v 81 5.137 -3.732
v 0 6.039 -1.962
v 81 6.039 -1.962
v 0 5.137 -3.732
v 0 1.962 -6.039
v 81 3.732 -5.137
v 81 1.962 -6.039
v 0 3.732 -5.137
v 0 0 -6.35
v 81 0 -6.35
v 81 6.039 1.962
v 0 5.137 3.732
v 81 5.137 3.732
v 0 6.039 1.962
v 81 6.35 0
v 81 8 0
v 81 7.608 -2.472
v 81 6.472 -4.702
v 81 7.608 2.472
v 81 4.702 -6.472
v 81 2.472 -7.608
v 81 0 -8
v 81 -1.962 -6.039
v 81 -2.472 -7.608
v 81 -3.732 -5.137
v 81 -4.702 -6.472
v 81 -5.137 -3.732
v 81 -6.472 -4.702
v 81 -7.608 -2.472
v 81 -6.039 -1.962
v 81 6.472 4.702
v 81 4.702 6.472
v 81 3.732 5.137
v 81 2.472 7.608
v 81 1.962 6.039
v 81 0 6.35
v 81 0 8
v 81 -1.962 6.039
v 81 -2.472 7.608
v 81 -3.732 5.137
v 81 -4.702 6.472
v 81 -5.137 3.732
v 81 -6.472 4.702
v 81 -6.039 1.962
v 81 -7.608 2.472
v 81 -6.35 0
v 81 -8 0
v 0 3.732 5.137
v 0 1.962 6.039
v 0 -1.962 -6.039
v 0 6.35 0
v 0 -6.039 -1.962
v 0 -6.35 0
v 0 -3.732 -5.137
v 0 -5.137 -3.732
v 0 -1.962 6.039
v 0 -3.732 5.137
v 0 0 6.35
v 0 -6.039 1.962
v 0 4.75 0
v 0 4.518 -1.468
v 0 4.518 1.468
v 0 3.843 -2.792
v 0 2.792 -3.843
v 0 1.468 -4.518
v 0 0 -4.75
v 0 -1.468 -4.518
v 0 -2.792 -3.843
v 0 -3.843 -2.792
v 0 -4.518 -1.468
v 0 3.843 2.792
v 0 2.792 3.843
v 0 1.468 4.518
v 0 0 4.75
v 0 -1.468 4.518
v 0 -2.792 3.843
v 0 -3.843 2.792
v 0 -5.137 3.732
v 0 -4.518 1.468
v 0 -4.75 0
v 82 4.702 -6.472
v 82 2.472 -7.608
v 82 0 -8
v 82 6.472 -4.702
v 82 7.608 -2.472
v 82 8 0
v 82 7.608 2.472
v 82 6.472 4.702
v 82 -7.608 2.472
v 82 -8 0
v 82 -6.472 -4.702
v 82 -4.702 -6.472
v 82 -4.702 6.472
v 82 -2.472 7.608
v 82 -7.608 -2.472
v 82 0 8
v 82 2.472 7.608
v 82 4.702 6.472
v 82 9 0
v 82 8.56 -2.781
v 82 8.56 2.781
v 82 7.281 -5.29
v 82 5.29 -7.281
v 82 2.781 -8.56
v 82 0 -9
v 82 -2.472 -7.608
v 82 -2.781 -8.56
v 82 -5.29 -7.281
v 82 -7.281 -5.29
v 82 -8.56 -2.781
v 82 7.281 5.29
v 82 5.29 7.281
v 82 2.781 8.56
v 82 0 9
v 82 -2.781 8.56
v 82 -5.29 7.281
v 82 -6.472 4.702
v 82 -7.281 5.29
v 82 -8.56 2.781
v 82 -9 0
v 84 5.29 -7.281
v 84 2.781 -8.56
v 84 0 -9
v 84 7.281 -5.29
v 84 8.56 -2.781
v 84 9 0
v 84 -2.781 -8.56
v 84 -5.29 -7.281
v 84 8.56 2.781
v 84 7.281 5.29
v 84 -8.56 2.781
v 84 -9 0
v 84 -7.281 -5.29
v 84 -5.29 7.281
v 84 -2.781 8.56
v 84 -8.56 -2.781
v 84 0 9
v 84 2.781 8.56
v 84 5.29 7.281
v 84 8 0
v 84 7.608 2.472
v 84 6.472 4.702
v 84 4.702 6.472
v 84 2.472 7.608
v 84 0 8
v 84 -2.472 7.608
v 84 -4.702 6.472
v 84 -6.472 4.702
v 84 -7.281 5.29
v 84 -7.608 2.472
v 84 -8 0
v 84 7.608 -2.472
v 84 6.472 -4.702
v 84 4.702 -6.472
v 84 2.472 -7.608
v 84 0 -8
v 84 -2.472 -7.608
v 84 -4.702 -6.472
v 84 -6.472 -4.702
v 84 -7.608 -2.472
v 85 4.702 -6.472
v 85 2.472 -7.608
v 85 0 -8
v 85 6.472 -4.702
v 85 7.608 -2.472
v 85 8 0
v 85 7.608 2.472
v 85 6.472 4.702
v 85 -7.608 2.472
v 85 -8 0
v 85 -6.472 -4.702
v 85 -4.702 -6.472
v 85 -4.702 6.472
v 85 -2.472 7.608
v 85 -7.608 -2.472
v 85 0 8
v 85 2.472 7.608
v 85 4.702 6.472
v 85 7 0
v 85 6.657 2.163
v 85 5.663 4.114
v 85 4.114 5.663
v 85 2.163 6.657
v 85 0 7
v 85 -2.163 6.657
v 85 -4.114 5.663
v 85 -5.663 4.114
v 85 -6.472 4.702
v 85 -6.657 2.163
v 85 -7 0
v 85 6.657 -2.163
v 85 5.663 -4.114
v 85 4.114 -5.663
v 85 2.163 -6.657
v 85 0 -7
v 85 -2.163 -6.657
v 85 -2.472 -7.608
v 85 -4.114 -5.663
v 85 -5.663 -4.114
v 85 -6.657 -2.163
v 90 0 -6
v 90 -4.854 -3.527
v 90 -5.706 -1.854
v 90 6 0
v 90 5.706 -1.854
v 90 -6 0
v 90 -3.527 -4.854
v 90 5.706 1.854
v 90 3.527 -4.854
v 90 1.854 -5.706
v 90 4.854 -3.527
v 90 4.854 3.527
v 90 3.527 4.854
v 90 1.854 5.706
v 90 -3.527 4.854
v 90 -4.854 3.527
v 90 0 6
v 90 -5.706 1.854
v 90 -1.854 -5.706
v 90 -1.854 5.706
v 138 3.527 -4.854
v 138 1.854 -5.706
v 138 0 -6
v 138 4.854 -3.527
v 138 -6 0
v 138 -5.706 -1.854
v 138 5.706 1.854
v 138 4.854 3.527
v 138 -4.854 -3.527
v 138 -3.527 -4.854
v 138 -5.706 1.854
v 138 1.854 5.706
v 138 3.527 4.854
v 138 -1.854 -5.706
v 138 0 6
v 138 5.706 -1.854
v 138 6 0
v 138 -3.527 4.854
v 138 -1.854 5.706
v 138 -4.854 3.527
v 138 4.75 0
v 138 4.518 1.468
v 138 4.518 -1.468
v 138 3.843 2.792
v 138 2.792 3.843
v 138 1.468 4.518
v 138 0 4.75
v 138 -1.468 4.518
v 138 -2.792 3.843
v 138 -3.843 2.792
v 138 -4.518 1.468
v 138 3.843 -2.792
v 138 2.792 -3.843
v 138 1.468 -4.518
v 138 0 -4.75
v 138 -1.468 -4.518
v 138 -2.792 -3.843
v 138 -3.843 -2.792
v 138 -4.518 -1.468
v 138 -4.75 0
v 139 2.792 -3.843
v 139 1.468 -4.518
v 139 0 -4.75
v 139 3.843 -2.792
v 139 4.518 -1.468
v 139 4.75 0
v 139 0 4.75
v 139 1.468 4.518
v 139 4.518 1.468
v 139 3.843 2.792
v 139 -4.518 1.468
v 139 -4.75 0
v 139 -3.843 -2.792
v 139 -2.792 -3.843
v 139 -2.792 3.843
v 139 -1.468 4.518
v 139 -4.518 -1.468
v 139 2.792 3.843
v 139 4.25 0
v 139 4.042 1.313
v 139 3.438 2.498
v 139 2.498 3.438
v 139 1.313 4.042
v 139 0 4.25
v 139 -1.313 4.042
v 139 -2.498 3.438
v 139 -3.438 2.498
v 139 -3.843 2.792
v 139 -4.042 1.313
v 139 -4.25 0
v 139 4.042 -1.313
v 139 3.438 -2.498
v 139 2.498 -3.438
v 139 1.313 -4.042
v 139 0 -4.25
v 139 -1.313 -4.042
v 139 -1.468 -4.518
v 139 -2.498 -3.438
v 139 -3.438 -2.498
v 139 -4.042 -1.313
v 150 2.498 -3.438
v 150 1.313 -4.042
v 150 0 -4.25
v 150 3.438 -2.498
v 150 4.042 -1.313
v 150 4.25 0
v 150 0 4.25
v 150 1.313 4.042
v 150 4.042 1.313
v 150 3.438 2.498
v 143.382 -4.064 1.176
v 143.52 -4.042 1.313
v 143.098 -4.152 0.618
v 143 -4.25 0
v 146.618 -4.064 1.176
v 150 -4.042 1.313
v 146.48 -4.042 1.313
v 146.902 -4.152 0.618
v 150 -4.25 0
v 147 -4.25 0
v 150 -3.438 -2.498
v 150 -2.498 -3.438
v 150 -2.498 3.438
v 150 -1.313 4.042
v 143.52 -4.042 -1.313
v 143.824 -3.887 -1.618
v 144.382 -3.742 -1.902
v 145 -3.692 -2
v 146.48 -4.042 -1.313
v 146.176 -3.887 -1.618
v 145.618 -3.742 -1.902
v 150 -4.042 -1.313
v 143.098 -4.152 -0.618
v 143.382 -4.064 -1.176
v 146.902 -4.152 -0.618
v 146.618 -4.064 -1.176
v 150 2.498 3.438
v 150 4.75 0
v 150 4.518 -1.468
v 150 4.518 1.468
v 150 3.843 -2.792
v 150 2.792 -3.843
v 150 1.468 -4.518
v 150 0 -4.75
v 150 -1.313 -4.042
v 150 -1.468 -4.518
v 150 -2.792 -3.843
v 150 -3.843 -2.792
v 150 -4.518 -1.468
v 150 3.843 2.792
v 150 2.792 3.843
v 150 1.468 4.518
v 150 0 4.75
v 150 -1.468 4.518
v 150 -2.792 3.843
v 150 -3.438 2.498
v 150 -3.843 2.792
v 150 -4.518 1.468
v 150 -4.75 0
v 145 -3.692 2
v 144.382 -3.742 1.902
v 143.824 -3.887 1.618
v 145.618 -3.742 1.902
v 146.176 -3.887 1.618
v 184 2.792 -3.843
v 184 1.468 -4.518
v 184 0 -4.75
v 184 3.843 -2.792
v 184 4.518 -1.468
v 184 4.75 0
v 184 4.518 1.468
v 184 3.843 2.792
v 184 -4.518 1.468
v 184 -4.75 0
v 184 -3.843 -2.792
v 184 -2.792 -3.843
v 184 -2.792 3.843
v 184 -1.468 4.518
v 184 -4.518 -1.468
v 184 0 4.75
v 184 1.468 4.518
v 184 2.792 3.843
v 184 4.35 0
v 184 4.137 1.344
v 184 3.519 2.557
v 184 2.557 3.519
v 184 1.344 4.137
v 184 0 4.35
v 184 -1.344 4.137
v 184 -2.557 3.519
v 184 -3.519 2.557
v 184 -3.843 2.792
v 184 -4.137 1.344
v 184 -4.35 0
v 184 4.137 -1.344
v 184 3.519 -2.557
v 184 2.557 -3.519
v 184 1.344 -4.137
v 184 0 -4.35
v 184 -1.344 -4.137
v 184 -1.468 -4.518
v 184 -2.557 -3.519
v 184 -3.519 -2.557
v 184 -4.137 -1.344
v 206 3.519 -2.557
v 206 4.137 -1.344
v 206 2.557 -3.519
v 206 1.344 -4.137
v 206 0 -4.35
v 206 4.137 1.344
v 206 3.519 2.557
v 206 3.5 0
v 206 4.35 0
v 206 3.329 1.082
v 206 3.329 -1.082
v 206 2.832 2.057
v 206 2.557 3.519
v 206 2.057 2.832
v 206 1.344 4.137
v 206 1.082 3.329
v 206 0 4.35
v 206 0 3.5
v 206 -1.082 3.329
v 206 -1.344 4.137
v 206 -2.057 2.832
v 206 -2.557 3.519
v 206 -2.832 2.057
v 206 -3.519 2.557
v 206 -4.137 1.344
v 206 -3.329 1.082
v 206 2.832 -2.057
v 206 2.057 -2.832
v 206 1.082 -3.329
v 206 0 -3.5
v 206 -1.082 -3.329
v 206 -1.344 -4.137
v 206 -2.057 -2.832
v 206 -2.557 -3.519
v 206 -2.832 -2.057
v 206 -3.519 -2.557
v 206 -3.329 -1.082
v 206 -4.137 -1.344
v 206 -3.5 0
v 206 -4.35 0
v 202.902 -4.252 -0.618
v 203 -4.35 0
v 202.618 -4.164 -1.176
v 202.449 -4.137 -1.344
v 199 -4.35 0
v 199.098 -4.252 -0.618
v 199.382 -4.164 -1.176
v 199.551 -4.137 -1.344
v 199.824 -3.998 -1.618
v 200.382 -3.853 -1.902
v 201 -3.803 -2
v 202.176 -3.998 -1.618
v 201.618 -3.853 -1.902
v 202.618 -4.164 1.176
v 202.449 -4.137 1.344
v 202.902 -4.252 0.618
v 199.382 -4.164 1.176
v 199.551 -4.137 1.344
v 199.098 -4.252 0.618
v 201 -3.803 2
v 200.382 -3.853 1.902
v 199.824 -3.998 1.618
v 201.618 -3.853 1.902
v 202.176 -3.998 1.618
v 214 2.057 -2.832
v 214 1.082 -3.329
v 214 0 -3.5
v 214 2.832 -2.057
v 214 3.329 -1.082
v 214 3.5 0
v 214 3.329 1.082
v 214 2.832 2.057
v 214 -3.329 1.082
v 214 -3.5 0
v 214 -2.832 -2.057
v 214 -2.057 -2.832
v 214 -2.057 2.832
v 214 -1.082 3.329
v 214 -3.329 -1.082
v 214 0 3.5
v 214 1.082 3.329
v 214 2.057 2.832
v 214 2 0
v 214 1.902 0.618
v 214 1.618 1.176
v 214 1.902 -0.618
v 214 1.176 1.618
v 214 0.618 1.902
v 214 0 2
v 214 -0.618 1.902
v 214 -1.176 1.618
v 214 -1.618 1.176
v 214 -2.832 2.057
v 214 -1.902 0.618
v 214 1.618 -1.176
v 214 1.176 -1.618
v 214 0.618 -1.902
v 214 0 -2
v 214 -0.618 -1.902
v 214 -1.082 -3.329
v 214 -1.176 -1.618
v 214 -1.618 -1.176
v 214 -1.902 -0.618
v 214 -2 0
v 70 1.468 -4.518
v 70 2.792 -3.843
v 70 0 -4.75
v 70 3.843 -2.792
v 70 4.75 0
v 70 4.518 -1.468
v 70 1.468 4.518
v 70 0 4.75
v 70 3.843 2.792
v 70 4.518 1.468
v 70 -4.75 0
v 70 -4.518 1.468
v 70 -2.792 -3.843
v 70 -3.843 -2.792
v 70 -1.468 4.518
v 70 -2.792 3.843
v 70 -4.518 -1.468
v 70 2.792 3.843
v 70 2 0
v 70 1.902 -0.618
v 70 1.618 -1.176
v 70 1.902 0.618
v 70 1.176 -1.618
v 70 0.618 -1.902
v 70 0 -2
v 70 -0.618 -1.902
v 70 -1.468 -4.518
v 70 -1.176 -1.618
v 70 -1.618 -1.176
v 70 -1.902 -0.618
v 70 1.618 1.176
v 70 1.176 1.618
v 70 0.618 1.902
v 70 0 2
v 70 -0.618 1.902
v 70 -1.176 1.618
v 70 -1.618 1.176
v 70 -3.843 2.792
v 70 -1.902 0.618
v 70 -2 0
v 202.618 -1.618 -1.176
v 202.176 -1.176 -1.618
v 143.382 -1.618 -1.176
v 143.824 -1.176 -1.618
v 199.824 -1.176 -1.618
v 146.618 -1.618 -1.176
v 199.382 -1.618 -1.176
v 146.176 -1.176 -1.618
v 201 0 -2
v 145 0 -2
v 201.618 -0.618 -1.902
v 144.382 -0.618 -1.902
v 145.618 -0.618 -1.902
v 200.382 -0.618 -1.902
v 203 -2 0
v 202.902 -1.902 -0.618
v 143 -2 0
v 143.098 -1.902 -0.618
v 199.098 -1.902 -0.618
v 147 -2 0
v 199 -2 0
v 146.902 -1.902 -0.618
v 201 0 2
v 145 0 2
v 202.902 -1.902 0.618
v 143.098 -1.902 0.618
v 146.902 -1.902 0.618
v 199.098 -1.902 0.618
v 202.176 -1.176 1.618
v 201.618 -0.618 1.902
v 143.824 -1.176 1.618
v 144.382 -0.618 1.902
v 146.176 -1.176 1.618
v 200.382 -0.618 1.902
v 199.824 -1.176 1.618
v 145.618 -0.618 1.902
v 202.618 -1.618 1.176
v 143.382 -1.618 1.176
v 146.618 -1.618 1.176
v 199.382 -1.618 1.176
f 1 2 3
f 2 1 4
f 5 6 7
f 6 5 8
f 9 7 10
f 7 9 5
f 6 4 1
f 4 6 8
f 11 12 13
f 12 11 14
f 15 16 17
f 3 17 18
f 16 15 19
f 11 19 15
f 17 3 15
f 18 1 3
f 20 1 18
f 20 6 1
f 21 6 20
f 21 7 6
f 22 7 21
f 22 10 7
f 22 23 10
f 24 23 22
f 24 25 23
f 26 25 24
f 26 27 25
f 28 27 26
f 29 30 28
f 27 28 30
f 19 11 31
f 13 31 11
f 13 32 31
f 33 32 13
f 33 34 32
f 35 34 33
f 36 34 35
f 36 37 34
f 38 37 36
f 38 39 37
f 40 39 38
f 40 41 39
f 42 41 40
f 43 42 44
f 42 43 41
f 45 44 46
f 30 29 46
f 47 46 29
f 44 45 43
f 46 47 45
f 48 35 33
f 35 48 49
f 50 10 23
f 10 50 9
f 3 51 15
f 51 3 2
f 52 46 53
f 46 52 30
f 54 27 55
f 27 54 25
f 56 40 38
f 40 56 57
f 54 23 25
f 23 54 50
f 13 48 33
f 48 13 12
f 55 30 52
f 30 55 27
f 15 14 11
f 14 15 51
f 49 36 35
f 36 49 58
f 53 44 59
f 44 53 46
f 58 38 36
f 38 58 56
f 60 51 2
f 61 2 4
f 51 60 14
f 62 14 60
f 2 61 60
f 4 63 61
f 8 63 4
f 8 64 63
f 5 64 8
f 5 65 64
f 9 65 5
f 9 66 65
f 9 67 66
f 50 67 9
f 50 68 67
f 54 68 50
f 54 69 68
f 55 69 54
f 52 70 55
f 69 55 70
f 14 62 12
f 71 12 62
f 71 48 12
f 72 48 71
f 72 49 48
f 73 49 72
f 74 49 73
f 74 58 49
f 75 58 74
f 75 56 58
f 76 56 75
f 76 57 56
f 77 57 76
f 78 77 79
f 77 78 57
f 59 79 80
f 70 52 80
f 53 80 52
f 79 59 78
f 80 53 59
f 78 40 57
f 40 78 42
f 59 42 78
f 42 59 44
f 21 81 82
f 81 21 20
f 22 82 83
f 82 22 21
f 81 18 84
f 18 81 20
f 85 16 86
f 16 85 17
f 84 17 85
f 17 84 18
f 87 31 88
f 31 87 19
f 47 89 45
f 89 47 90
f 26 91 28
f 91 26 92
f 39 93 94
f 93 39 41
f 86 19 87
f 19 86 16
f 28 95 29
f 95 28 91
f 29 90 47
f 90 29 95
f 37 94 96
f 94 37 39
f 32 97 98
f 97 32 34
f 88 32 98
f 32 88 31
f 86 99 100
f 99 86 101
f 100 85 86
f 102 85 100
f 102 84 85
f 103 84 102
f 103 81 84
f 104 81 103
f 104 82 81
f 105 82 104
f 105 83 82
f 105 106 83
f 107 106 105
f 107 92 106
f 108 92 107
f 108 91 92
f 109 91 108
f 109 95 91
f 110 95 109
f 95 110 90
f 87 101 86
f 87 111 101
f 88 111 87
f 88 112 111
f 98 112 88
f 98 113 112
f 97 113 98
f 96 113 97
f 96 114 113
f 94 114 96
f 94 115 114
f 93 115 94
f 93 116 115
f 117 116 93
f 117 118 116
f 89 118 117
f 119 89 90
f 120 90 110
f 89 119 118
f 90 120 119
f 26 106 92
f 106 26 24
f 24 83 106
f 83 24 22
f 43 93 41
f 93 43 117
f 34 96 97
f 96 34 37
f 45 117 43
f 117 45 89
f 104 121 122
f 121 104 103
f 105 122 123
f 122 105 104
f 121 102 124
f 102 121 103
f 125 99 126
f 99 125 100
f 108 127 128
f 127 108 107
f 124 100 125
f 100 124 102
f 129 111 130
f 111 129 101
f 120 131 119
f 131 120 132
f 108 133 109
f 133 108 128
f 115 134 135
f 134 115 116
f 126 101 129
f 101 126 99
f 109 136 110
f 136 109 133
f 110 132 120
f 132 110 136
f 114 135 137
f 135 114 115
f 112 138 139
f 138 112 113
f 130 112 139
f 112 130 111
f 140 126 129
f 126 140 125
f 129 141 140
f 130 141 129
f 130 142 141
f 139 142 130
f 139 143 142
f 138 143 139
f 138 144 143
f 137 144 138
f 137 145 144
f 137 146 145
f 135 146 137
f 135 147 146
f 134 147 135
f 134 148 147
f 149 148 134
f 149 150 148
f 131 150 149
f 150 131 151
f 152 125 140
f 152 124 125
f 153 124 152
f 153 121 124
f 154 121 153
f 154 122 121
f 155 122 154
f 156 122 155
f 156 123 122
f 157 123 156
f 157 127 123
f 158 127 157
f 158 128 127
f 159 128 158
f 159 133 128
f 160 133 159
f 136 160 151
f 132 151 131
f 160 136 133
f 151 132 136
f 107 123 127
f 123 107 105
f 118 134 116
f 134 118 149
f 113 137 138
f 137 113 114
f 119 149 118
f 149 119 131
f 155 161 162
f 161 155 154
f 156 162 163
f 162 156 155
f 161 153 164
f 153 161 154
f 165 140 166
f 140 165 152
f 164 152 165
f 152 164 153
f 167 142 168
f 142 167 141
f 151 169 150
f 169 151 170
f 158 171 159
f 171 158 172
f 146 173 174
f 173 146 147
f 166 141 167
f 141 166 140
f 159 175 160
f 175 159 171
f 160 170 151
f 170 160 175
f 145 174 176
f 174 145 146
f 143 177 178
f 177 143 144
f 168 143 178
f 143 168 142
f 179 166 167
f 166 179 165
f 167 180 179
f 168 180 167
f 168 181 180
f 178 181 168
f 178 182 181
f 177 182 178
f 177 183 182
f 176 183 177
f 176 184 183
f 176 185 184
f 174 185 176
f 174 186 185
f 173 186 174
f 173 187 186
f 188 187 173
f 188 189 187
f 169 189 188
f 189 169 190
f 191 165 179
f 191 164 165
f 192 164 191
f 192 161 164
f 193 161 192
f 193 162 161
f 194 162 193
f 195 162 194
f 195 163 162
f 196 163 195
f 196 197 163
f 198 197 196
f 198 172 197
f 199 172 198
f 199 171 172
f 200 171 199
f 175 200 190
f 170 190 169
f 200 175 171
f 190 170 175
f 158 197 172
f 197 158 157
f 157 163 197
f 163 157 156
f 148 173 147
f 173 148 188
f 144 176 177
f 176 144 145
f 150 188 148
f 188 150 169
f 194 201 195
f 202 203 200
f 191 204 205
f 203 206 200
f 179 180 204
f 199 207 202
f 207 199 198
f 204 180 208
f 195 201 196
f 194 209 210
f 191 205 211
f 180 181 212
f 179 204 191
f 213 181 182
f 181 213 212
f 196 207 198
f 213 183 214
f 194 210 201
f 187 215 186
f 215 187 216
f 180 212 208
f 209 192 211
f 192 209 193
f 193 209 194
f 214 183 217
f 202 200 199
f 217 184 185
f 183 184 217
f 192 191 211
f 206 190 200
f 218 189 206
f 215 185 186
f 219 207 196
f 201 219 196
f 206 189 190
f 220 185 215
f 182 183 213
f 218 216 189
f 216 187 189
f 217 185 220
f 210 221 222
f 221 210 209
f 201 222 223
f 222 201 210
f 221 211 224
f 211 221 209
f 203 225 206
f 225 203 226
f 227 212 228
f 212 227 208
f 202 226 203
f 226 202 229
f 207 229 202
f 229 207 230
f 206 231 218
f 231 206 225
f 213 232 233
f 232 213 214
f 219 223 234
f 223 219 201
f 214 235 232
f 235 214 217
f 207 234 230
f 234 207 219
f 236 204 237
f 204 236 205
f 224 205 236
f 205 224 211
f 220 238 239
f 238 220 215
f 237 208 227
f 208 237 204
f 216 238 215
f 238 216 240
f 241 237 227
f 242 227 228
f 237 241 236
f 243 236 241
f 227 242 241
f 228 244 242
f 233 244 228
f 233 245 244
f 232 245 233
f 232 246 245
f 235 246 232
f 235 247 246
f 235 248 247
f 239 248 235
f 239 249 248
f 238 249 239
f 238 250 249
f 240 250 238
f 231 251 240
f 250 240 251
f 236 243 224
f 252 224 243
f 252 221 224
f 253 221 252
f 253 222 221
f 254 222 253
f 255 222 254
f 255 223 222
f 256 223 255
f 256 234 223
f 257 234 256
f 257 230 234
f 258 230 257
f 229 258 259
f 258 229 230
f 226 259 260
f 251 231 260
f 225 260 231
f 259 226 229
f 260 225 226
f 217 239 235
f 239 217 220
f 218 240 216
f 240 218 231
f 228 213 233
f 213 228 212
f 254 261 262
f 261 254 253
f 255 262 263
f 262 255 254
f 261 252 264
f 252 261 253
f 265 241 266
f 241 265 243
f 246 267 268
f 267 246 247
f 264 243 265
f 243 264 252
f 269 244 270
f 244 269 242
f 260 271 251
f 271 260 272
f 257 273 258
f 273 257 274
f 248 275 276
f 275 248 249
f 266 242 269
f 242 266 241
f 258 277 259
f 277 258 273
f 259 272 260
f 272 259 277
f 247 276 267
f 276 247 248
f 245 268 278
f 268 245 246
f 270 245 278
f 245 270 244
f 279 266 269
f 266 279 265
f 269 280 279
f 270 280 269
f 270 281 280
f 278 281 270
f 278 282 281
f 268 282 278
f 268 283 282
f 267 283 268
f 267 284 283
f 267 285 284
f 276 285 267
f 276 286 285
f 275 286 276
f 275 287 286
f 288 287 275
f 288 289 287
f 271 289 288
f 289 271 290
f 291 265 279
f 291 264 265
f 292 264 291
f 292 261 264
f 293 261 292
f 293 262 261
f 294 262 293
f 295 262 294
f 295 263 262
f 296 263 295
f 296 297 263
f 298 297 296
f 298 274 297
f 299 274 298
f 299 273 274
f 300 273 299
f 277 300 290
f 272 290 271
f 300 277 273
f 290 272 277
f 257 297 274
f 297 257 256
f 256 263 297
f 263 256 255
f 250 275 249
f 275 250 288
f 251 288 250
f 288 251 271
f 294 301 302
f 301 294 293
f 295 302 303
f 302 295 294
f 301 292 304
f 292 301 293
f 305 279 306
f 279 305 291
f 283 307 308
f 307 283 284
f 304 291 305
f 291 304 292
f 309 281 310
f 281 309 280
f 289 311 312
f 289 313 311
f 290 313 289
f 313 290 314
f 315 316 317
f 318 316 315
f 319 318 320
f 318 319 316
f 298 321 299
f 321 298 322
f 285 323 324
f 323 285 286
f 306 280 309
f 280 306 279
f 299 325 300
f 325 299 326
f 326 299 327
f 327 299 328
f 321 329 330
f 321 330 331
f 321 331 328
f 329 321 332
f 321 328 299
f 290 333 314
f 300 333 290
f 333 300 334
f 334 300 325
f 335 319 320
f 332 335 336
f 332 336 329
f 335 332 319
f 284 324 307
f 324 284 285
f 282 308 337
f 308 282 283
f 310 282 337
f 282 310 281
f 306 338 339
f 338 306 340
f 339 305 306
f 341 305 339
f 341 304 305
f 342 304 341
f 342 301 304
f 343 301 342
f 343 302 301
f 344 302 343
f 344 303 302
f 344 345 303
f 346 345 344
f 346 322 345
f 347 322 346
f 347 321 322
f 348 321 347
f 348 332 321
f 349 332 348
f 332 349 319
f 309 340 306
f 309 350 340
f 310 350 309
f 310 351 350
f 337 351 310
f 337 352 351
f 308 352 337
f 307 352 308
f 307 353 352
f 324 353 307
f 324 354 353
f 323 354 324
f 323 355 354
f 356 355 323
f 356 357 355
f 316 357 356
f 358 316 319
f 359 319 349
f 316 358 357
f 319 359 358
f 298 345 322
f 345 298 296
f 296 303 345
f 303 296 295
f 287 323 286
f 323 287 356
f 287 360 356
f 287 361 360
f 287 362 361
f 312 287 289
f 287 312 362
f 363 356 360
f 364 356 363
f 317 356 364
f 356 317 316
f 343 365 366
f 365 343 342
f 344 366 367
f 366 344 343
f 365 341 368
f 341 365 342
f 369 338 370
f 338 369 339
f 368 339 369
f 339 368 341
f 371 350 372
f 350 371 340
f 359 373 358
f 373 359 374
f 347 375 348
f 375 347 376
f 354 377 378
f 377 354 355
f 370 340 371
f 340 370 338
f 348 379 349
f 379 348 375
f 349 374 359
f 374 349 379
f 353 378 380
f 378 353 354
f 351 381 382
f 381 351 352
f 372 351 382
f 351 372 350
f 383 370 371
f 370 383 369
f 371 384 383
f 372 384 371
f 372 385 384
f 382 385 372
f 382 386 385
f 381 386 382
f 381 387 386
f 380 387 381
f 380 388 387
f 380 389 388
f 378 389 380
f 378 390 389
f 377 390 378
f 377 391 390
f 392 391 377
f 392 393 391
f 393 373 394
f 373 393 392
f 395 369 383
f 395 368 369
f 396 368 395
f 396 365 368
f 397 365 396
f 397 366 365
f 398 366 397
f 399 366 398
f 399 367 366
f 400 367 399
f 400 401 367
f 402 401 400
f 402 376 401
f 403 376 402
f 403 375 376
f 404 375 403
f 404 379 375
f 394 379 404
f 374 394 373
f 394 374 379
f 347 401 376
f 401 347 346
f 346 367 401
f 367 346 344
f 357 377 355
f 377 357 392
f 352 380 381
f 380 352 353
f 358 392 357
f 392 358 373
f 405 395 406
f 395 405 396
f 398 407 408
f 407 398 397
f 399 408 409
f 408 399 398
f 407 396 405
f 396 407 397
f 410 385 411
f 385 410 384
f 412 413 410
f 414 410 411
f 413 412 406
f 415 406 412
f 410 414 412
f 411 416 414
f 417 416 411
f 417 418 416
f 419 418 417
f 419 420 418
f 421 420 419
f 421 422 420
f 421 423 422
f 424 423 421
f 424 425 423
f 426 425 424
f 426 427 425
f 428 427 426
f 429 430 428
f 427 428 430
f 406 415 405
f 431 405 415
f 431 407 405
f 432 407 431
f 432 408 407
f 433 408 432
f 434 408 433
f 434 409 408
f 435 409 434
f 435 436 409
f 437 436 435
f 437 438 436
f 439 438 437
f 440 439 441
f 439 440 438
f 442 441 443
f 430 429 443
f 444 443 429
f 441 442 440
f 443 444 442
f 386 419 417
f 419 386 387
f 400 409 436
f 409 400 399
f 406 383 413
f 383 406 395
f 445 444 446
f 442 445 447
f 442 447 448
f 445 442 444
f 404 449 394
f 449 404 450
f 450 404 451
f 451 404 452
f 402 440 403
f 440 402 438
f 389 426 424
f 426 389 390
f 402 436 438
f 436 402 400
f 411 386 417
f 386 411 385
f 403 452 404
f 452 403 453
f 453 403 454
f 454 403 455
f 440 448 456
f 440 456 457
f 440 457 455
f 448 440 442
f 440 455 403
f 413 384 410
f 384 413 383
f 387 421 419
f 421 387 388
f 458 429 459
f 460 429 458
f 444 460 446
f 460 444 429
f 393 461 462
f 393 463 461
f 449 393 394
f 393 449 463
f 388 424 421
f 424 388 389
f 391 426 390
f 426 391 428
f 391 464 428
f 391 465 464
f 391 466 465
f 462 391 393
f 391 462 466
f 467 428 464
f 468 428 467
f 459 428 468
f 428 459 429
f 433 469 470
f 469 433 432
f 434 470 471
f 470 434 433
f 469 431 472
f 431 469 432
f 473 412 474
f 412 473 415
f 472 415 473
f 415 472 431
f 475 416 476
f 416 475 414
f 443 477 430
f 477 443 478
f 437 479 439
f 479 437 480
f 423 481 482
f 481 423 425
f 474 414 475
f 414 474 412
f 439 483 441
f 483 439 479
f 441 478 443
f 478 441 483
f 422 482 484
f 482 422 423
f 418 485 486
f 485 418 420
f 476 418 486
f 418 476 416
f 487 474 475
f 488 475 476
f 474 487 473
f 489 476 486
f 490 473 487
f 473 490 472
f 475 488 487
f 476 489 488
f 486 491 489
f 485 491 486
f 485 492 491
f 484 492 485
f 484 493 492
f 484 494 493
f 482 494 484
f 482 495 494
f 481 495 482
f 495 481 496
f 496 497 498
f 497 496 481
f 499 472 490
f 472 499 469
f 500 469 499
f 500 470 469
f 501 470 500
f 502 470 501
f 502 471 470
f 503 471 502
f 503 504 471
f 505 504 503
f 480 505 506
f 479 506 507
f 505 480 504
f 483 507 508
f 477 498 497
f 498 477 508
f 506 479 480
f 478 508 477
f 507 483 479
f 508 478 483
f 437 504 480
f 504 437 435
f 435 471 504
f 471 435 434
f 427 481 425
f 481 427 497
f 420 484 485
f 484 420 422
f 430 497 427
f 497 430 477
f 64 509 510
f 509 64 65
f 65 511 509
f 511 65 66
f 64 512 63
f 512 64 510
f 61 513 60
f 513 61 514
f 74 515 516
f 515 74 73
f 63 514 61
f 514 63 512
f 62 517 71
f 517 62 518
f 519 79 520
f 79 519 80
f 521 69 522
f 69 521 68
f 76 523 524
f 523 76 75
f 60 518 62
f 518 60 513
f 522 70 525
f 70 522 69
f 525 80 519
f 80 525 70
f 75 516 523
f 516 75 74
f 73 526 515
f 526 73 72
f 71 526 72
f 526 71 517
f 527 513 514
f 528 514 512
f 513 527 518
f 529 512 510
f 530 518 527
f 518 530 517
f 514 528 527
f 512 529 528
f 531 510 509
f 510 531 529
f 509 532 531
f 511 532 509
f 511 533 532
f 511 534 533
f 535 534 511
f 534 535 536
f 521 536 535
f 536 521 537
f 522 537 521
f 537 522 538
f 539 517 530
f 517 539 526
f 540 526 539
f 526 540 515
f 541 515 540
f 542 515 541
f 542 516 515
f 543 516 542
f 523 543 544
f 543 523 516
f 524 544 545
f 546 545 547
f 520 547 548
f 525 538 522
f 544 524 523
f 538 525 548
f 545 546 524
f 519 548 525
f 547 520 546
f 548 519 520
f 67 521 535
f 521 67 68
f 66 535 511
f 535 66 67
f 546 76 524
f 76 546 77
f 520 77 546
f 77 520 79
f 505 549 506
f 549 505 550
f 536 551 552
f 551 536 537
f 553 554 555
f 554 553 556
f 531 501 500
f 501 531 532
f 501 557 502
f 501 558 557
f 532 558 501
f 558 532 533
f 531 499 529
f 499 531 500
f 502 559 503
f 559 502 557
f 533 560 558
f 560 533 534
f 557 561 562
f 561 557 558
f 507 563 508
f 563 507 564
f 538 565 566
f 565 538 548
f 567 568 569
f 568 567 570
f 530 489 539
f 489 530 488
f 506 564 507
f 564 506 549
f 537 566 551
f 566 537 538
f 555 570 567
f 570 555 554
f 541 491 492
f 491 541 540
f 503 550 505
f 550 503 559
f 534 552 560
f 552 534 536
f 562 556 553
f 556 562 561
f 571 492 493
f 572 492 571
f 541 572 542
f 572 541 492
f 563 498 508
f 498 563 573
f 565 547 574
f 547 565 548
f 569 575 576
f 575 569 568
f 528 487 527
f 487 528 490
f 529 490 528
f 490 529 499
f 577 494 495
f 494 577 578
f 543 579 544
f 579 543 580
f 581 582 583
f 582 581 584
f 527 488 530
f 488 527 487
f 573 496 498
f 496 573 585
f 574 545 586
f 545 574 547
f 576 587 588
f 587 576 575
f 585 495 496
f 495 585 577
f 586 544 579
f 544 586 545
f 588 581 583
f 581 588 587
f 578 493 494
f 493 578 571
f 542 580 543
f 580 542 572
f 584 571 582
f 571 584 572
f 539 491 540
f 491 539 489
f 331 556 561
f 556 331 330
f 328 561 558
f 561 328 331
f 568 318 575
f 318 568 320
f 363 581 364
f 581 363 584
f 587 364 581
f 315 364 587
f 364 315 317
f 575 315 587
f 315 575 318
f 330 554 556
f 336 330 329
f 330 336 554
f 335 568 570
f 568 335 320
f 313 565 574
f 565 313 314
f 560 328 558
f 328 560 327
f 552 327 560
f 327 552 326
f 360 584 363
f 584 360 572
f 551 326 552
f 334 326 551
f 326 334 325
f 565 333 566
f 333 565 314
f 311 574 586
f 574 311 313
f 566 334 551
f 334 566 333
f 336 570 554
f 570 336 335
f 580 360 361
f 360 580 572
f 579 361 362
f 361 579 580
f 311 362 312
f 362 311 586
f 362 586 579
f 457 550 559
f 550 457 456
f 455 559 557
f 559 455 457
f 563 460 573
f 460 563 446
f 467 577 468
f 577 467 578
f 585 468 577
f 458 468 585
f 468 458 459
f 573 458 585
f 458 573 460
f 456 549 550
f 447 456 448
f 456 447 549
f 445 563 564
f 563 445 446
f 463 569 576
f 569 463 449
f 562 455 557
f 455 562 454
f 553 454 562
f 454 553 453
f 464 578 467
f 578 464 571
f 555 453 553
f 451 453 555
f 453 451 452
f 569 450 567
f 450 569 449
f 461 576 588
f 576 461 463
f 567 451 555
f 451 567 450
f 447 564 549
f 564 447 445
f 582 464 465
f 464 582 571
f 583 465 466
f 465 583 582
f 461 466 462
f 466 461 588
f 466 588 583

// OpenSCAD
// openNSP_project, drone top section version 1.0.1
// Zexuan Qiao, 2024
// under GPL license ver3

droneTopLOA = 214.0; //.1
bellTenon = 8.0; //.1
bellTenonDiameter = 7; //.1
topFerruleWood = 22; //.1
topFerruleWoodDiameter = 8.7; //.1
topWooden1 = 34.0; //.1
topWoodenDiameter = 9.5; //.1
beadFerruleWood = 11.0; //.1
beadFerruleWoodDiameter = 8.5; //.1
topWooden2 = 1.0; //.1
mainWooden = 48.0; //.1
mainWoodenDiameter = 12.0; //.1

decoration1 = 5.0; //.1
decoration2 = 1.0; //.1
decoration3 = 2.0; //.1
decoration4 = 1.0; //.1

decoration1Diameter = 14.0; //.1
decoration2Diameter = 16.0; //.1
decoration3Diameter = 18.0; //.1
decoration4Diameter = 16.0; //.1

chamberWooden = 81.0; //.1
chamberWoodenDiameter = 12.7; //.1

chamberBore = 9.5; //.1
chamberBoreLength = 70.0; //.1

mainBore =4.0; //.1

sideHoleDiameter = 4.0; //.1

hole1Pos = 145.0; //.1
hole2Pos = 201.0; //.1

/* [Utilities] */
// Segments, the higher the value, the smoother the surface would be.
$fn = 20;


rotate([0, 90, 0]) {
  difference() {
    union() {
      cylinder(h = chamberWooden, d = chamberWoodenDiameter);
      translate([0, 0, chamberWooden]) cylinder(h = decoration4, d = decoration4Diameter);
      translate([0, 0, chamberWooden+decoration4]) cylinder(h = decoration3, d = decoration3Diameter);
      translate([0, 0, chamberWooden+decoration4+decoration3]) cylinder(h = decoration2, d = decoration2Diameter);
      translate([0, 0, chamberWooden+decoration4+decoration3+decoration2]) cylinder(h = decoration1, d1 = decoration1Diameter, d2 = mainWoodenDiameter);
      translate([0, 0, chamberWooden+decoration4+decoration3+decoration2+decoration1]) cylinder(h = mainWooden, d = mainWoodenDiameter);
      translate([0, 0, chamberWooden+decoration4+decoration3+decoration2+decoration1+mainWooden]) cylinder(h = topWooden2, d = topWoodenDiameter);
      translate([0, 0, chamberWooden+decoration4+decoration3+decoration2+decoration1+mainWooden+topWooden2]) cylinder(h = beadFerruleWood, d = beadFerruleWoodDiameter);
      translate([0, 0, chamberWooden+decoration4+decoration3+decoration2+decoration1+mainWooden+topWooden2+beadFerruleWood]) cylinder(h = topWooden1, d = topWoodenDiameter);
      translate([0, 0, chamberWooden+decoration4+decoration3+decoration2+decoration1+mainWooden+topWooden2+beadFerruleWood+topWooden1]) cylinder(h = topFerruleWood, d = topFerruleWoodDiameter);
      translate([0, 0, chamberWooden+decoration4+decoration3+decoration2+decoration1+mainWooden+topWooden2+beadFerruleWood+topWooden1+topFerruleWood]) cylinder(h = bellTenon, d = bellTenonDiameter);
    }
    cylinder(h = chamberBoreLength, d = chamberBore);
    cylinder(h = droneTopLOA, d = mainBore);
    rotate([90, 0, 0]) translate([0, hole1Pos, 0]) cylinder(h = 10, d = sideHoleDiameter);
    rotate([90, 0, 0]) translate([0, hole2Pos, 0]) cylinder(h = 10, d = sideHoleDiameter);
  }
}
